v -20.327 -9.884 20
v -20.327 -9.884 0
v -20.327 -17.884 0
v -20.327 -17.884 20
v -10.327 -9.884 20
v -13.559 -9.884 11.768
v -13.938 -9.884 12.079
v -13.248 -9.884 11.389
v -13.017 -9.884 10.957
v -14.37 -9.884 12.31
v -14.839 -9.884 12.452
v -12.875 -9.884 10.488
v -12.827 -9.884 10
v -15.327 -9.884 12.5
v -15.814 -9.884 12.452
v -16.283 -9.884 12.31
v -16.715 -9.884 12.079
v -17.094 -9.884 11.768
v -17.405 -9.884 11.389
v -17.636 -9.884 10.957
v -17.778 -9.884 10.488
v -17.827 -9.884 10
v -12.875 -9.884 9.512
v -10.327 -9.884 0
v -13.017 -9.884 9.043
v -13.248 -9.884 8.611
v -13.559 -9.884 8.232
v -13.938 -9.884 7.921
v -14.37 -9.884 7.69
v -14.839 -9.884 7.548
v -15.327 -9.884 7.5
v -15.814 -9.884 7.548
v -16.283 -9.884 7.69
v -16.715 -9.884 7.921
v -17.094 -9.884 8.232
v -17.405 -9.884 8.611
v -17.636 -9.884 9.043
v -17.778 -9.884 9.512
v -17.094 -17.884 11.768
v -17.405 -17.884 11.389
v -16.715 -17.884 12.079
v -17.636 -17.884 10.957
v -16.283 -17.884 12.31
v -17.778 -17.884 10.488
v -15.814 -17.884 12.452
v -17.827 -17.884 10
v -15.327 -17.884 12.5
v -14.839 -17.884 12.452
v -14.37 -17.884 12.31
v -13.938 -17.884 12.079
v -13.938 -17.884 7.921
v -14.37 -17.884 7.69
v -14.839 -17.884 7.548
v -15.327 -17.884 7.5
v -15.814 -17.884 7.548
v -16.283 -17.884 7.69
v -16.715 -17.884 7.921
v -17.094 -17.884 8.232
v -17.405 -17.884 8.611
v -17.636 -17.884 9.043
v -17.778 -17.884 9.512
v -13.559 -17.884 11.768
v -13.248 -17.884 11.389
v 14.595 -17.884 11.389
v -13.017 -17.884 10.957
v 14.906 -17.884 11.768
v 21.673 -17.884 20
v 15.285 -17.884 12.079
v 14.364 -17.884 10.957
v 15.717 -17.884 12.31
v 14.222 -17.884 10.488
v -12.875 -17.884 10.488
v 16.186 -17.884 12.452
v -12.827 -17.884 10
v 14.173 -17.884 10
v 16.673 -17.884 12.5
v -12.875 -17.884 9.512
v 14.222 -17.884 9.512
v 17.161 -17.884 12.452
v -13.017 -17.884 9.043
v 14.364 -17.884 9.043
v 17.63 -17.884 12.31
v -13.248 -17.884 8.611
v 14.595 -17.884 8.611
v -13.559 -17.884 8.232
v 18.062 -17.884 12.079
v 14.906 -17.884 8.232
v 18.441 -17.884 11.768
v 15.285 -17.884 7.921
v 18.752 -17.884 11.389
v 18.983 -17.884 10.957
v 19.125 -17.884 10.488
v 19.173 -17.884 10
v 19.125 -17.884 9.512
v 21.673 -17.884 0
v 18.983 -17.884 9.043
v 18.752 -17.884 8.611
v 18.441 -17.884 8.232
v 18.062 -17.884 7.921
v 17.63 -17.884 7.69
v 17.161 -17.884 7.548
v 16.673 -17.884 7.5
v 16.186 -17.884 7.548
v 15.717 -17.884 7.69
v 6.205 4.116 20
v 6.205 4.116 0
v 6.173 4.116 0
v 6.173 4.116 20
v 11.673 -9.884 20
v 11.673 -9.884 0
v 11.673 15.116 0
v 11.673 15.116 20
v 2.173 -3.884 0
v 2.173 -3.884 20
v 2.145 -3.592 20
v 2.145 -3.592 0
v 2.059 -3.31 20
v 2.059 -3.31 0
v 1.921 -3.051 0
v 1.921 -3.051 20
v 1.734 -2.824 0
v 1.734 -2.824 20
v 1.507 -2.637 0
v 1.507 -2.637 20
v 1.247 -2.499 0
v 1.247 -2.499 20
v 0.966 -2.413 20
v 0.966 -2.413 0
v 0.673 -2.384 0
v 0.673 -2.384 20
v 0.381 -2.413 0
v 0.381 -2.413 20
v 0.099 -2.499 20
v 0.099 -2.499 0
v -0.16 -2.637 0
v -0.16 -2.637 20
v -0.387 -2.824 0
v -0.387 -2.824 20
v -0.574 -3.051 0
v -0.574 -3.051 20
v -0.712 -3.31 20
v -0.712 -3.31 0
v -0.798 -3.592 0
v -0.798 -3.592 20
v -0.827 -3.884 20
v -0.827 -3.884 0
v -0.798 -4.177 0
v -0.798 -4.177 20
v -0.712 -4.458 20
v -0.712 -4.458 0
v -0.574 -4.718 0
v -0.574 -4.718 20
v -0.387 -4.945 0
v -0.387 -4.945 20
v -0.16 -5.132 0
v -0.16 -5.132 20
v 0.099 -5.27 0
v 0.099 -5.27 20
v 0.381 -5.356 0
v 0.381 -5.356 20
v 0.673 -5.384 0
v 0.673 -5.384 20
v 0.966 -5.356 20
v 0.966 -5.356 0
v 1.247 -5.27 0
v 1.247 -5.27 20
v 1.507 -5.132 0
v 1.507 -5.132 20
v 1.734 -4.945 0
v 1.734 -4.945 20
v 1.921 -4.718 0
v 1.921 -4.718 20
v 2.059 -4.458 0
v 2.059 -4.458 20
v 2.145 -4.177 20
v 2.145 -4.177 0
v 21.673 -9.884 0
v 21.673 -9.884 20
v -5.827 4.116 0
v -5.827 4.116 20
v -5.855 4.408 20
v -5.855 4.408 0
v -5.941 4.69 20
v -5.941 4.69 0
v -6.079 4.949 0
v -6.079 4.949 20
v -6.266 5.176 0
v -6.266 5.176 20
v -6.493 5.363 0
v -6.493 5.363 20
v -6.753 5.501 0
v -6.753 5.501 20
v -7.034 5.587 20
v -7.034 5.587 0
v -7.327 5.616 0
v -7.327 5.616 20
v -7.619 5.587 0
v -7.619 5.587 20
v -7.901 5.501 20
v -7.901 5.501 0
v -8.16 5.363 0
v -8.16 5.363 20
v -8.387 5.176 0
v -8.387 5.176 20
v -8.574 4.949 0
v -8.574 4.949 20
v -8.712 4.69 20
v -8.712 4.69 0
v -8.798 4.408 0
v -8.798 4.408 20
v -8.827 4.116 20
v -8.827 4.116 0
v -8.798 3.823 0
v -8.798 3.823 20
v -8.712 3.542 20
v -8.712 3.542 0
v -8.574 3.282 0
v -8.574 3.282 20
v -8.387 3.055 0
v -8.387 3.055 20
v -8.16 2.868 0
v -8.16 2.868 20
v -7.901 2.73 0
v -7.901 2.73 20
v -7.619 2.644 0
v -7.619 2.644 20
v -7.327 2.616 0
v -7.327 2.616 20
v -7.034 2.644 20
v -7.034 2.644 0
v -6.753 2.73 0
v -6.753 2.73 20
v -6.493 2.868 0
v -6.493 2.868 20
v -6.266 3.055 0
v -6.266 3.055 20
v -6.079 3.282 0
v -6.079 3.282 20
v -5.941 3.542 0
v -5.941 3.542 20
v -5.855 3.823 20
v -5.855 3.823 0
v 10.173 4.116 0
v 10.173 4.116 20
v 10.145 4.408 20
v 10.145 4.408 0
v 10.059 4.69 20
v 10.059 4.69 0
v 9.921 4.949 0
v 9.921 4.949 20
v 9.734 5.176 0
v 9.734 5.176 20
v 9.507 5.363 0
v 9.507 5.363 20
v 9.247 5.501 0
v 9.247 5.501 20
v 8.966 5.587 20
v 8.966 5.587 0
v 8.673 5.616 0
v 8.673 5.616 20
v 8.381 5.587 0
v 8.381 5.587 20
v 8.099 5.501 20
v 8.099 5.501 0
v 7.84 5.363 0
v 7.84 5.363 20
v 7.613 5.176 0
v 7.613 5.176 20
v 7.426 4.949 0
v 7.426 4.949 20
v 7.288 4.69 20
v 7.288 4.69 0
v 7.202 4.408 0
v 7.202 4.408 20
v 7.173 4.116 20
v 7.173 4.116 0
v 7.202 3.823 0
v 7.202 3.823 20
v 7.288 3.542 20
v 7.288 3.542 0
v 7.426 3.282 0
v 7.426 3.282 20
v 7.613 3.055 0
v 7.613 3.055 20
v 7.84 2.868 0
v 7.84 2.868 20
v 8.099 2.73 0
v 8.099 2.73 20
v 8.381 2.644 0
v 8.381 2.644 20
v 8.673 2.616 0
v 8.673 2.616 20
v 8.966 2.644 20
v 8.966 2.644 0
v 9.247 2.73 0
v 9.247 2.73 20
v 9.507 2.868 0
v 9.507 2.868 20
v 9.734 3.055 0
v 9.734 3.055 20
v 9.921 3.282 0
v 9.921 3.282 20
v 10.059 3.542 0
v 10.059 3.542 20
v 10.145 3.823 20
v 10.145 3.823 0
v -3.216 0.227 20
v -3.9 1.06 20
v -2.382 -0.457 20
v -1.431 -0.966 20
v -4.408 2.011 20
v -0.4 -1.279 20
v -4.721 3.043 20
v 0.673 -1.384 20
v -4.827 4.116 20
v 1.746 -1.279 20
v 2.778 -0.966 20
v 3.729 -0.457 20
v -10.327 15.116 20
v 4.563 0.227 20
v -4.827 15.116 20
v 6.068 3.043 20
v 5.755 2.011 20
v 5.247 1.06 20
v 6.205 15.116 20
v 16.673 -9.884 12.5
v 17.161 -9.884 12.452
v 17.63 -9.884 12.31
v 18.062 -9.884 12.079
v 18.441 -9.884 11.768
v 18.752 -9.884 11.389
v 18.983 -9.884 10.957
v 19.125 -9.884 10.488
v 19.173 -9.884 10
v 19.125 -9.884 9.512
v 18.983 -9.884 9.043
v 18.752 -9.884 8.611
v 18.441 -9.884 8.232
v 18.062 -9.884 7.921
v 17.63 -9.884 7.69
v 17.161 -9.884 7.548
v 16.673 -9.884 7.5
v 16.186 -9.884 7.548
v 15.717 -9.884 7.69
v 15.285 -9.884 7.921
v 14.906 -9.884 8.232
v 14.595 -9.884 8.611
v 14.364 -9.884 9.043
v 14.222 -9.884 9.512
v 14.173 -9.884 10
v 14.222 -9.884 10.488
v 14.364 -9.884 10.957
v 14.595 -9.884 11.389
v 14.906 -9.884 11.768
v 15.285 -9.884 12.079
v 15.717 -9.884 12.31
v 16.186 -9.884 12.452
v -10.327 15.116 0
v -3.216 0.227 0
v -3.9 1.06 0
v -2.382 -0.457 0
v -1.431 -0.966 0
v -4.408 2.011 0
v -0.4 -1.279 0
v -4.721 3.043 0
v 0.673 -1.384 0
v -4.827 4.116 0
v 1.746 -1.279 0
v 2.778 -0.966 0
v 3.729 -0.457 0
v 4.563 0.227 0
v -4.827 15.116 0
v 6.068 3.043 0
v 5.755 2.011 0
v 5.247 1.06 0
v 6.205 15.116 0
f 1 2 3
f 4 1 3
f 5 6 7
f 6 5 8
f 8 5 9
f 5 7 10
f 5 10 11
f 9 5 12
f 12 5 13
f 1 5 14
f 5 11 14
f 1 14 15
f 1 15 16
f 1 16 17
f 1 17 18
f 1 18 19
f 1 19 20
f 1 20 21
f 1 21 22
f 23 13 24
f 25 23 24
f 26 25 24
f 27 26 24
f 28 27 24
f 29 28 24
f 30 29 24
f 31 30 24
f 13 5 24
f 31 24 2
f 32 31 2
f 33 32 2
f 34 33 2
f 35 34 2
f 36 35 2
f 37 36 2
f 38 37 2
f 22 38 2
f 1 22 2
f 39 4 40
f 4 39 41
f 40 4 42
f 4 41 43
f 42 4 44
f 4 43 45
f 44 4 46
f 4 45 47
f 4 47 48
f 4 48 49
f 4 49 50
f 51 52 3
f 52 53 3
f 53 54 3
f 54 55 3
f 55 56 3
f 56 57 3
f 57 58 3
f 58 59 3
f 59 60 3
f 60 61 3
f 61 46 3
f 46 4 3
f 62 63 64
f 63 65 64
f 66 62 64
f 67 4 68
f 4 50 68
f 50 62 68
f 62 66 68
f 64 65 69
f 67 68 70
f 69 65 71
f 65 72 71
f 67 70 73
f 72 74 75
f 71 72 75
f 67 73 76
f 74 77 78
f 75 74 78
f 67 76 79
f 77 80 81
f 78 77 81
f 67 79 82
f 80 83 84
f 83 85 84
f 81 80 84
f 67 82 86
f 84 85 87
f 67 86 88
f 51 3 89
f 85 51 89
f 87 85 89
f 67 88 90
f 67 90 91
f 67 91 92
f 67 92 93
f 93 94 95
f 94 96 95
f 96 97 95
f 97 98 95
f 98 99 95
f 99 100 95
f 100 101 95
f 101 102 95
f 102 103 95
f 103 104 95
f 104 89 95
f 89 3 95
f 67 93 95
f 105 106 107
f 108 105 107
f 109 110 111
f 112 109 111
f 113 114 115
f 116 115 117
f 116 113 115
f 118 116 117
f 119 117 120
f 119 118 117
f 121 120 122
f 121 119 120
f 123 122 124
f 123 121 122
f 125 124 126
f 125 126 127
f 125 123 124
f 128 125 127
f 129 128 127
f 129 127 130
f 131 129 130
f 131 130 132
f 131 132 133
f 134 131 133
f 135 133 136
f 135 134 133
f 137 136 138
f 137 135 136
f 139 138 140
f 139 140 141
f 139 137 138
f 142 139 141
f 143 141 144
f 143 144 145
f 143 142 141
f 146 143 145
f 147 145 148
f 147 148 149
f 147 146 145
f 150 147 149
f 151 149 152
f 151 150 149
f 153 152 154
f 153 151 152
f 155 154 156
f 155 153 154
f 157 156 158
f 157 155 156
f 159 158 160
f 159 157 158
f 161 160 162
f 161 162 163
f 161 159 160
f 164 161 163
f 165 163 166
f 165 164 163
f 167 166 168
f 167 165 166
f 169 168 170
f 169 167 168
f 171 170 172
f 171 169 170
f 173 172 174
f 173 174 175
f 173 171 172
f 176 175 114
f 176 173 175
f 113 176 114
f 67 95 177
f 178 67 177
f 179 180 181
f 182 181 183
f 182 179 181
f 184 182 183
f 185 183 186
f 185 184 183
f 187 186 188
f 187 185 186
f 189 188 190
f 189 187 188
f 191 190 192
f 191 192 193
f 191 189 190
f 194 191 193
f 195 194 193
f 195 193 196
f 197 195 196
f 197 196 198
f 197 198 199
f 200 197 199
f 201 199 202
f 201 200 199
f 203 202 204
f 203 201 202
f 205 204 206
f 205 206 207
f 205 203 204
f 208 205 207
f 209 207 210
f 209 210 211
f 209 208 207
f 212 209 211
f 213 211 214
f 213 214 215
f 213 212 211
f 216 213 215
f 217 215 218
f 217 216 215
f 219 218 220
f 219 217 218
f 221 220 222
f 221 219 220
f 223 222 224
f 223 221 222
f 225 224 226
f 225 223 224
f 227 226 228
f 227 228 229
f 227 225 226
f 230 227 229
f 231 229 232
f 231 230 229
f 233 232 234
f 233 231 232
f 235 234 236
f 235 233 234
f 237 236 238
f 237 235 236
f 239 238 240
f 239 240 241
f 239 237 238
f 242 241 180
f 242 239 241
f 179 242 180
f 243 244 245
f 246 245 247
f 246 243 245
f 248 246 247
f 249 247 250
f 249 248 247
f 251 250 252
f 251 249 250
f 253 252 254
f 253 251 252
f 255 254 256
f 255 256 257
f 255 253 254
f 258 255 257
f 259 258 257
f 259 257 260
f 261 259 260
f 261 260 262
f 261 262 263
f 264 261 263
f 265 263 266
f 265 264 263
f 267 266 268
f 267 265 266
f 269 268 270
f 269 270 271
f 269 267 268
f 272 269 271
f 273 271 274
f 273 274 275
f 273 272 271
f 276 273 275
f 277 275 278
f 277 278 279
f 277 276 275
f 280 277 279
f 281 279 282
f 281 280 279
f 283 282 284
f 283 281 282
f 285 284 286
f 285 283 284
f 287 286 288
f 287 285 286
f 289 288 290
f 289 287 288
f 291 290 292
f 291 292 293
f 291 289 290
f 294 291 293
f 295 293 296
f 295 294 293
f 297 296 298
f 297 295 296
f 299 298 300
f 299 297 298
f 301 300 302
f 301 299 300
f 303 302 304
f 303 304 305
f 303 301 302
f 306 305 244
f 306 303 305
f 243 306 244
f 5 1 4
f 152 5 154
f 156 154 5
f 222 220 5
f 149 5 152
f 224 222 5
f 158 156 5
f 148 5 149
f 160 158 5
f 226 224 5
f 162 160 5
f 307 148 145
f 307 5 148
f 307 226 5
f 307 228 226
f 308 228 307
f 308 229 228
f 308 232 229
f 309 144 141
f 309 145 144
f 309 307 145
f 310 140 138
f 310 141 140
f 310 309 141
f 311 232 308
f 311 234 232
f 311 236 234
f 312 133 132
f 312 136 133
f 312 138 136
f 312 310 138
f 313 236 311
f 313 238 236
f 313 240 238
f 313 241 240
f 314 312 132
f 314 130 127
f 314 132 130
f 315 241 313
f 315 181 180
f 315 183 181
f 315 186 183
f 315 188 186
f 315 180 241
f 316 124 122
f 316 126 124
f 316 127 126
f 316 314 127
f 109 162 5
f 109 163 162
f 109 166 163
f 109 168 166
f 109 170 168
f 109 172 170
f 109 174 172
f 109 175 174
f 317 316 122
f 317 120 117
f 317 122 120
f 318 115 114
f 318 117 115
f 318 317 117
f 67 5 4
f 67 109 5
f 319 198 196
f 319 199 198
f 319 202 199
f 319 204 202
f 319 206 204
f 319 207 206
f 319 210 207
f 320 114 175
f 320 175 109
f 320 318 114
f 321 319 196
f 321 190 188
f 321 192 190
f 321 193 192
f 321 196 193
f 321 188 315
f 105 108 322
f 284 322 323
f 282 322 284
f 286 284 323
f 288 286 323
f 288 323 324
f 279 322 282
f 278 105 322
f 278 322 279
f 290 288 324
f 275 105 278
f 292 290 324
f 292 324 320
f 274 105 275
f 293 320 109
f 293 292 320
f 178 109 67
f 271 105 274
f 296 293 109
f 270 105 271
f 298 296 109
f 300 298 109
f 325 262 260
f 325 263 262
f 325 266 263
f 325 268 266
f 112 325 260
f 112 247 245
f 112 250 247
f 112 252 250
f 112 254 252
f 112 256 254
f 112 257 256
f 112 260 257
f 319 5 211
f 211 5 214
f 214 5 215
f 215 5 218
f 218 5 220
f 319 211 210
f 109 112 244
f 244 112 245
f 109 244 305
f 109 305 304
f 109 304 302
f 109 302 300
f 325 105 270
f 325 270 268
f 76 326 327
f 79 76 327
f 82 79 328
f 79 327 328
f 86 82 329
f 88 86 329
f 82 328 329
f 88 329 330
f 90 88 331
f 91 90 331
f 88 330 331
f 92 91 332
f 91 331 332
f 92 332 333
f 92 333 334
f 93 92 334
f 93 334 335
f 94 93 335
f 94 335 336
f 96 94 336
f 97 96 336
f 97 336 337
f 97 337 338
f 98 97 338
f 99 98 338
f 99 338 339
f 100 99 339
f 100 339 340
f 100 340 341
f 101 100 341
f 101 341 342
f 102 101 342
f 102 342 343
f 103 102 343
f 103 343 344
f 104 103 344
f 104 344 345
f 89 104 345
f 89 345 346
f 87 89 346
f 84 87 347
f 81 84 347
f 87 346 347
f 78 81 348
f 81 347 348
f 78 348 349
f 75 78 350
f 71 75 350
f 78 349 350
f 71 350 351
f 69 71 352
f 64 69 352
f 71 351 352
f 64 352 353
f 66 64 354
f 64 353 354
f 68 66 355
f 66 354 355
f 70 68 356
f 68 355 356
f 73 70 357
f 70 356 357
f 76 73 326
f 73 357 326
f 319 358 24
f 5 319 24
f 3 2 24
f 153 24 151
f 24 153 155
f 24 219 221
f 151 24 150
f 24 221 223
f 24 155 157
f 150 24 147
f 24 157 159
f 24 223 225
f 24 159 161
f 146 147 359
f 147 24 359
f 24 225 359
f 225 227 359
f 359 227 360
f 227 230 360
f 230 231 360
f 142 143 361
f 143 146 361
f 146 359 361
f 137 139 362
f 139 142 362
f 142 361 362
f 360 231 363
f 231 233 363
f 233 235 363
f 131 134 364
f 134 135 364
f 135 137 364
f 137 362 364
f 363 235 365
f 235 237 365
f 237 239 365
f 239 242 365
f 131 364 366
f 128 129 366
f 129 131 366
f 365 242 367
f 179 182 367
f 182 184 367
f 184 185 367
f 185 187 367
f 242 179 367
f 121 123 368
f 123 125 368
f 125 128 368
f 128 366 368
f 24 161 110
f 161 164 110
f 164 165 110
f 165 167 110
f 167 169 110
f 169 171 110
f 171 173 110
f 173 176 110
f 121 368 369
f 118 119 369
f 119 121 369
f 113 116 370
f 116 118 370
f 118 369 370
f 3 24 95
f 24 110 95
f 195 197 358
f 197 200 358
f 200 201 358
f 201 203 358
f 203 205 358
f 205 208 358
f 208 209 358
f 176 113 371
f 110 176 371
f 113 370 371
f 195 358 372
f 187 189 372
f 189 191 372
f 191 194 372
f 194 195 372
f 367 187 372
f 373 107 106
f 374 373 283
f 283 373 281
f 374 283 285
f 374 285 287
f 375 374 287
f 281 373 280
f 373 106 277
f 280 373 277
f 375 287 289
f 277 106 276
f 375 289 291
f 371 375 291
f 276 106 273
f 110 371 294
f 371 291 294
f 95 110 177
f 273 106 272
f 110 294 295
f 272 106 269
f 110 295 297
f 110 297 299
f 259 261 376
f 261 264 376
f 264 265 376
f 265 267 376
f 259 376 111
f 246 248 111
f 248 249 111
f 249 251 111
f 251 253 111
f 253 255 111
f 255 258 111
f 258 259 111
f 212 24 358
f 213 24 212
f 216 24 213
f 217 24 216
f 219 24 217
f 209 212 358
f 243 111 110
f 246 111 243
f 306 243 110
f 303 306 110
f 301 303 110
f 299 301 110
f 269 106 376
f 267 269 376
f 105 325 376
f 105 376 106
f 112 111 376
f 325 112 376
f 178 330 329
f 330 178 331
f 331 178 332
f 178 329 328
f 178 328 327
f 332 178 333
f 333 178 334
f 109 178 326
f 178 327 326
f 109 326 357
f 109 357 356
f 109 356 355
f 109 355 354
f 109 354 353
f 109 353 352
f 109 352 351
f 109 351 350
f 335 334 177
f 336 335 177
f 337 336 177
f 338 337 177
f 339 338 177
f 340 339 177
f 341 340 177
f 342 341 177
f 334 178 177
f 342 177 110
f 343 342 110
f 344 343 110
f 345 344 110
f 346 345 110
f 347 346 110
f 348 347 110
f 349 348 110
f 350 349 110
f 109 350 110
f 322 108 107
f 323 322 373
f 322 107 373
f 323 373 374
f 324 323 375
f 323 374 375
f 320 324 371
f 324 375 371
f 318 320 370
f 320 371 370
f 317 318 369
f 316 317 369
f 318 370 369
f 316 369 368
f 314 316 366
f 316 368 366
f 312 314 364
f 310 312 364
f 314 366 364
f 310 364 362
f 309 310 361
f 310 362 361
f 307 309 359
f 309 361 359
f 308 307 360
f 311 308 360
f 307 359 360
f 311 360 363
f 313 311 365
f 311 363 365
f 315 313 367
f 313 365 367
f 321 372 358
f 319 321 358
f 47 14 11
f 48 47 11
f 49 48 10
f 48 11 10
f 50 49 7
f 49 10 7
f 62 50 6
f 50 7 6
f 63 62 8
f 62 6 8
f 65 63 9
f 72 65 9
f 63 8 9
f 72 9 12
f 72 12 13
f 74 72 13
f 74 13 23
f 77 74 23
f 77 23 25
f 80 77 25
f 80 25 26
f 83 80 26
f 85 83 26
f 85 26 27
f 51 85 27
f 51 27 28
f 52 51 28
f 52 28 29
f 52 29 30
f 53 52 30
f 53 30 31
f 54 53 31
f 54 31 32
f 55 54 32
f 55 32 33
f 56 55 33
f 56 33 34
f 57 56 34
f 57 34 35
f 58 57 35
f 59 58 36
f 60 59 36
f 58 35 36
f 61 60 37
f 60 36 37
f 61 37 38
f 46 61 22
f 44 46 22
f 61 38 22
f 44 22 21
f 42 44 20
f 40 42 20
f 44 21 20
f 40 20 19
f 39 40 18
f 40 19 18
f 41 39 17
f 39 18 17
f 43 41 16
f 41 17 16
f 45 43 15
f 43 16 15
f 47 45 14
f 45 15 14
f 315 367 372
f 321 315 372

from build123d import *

# Parameters (mm, degrees)
SKETCH_1_R          = 1.5
EXTRUDE_1_DEPTH     = 20
SKETCH_2_R          = 2.5
CUT_EXTRUDE_1_DEPTH = 20


with BuildPart() as part:
    # 草图1 → 凸台-拉伸1 (new body)
    with BuildSketch(Plane.XY):
        with BuildLine():
            Line((21.673469388, -17.884353741), (21.673469388, -9.884353741))
            Line((21.673469388, -9.884353741), (11.673469388, -9.884353741))
            Line((11.673469388, -9.884353741), (11.673469388, 15.115646259))
            Line((11.673469388, 15.115646259), (6.205006293, 15.115646259))
            Line((6.205006293, 15.115646259), (6.205006293, 4.115646259))
            Line((6.205006293, 4.115646259), (6.173469388, 4.115646259))
            ThreePointArc((6.173469388, 4.115646259), (0.673469388, -1.384353741), (-4.826530612, 4.115646259))
            Line((-4.826530612, 4.115646259), (-4.826530612, 15.115646259))
            Line((-4.826530612, 15.115646259), (-10.326530612, 15.115646259))
            Line((-10.326530612, 15.115646259), (-10.326530612, -9.884353741))
            Line((-10.326530612, -9.884353741), (-20.326530612, -9.884353741))
            Line((-20.326530612, -9.884353741), (-20.326530612, -17.884353741))
            Line((-20.326530612, -17.884353741), (21.673469388, -17.884353741))
        make_face()
        with Locations((0.673469388, -3.884353741)):
            Circle(SKETCH_1_R, mode=Mode.SUBTRACT)
        with Locations((-7.326530612, 4.115646259)):
            Circle(SKETCH_1_R, mode=Mode.SUBTRACT)
        with Locations((8.673469388, 4.115646259)):
            Circle(SKETCH_1_R, mode=Mode.SUBTRACT)
    extrude(amount=EXTRUDE_1_DEPTH)

    # 草图2 → 切除-拉伸1 (cut)
    with BuildSketch(Plane(origin=(0, -9.884353741, 0), x_dir=(1, 0, 0), z_dir=(0, 1, 0))):
        with Locations((16.673469388, -10)):
            Circle(SKETCH_2_R)
        with Locations((-15.326530612, -10)):
            Circle(SKETCH_2_R)
    extrude(amount=-CUT_EXTRUDE_1_DEPTH, mode=Mode.SUBTRACT)


solid = part.part
